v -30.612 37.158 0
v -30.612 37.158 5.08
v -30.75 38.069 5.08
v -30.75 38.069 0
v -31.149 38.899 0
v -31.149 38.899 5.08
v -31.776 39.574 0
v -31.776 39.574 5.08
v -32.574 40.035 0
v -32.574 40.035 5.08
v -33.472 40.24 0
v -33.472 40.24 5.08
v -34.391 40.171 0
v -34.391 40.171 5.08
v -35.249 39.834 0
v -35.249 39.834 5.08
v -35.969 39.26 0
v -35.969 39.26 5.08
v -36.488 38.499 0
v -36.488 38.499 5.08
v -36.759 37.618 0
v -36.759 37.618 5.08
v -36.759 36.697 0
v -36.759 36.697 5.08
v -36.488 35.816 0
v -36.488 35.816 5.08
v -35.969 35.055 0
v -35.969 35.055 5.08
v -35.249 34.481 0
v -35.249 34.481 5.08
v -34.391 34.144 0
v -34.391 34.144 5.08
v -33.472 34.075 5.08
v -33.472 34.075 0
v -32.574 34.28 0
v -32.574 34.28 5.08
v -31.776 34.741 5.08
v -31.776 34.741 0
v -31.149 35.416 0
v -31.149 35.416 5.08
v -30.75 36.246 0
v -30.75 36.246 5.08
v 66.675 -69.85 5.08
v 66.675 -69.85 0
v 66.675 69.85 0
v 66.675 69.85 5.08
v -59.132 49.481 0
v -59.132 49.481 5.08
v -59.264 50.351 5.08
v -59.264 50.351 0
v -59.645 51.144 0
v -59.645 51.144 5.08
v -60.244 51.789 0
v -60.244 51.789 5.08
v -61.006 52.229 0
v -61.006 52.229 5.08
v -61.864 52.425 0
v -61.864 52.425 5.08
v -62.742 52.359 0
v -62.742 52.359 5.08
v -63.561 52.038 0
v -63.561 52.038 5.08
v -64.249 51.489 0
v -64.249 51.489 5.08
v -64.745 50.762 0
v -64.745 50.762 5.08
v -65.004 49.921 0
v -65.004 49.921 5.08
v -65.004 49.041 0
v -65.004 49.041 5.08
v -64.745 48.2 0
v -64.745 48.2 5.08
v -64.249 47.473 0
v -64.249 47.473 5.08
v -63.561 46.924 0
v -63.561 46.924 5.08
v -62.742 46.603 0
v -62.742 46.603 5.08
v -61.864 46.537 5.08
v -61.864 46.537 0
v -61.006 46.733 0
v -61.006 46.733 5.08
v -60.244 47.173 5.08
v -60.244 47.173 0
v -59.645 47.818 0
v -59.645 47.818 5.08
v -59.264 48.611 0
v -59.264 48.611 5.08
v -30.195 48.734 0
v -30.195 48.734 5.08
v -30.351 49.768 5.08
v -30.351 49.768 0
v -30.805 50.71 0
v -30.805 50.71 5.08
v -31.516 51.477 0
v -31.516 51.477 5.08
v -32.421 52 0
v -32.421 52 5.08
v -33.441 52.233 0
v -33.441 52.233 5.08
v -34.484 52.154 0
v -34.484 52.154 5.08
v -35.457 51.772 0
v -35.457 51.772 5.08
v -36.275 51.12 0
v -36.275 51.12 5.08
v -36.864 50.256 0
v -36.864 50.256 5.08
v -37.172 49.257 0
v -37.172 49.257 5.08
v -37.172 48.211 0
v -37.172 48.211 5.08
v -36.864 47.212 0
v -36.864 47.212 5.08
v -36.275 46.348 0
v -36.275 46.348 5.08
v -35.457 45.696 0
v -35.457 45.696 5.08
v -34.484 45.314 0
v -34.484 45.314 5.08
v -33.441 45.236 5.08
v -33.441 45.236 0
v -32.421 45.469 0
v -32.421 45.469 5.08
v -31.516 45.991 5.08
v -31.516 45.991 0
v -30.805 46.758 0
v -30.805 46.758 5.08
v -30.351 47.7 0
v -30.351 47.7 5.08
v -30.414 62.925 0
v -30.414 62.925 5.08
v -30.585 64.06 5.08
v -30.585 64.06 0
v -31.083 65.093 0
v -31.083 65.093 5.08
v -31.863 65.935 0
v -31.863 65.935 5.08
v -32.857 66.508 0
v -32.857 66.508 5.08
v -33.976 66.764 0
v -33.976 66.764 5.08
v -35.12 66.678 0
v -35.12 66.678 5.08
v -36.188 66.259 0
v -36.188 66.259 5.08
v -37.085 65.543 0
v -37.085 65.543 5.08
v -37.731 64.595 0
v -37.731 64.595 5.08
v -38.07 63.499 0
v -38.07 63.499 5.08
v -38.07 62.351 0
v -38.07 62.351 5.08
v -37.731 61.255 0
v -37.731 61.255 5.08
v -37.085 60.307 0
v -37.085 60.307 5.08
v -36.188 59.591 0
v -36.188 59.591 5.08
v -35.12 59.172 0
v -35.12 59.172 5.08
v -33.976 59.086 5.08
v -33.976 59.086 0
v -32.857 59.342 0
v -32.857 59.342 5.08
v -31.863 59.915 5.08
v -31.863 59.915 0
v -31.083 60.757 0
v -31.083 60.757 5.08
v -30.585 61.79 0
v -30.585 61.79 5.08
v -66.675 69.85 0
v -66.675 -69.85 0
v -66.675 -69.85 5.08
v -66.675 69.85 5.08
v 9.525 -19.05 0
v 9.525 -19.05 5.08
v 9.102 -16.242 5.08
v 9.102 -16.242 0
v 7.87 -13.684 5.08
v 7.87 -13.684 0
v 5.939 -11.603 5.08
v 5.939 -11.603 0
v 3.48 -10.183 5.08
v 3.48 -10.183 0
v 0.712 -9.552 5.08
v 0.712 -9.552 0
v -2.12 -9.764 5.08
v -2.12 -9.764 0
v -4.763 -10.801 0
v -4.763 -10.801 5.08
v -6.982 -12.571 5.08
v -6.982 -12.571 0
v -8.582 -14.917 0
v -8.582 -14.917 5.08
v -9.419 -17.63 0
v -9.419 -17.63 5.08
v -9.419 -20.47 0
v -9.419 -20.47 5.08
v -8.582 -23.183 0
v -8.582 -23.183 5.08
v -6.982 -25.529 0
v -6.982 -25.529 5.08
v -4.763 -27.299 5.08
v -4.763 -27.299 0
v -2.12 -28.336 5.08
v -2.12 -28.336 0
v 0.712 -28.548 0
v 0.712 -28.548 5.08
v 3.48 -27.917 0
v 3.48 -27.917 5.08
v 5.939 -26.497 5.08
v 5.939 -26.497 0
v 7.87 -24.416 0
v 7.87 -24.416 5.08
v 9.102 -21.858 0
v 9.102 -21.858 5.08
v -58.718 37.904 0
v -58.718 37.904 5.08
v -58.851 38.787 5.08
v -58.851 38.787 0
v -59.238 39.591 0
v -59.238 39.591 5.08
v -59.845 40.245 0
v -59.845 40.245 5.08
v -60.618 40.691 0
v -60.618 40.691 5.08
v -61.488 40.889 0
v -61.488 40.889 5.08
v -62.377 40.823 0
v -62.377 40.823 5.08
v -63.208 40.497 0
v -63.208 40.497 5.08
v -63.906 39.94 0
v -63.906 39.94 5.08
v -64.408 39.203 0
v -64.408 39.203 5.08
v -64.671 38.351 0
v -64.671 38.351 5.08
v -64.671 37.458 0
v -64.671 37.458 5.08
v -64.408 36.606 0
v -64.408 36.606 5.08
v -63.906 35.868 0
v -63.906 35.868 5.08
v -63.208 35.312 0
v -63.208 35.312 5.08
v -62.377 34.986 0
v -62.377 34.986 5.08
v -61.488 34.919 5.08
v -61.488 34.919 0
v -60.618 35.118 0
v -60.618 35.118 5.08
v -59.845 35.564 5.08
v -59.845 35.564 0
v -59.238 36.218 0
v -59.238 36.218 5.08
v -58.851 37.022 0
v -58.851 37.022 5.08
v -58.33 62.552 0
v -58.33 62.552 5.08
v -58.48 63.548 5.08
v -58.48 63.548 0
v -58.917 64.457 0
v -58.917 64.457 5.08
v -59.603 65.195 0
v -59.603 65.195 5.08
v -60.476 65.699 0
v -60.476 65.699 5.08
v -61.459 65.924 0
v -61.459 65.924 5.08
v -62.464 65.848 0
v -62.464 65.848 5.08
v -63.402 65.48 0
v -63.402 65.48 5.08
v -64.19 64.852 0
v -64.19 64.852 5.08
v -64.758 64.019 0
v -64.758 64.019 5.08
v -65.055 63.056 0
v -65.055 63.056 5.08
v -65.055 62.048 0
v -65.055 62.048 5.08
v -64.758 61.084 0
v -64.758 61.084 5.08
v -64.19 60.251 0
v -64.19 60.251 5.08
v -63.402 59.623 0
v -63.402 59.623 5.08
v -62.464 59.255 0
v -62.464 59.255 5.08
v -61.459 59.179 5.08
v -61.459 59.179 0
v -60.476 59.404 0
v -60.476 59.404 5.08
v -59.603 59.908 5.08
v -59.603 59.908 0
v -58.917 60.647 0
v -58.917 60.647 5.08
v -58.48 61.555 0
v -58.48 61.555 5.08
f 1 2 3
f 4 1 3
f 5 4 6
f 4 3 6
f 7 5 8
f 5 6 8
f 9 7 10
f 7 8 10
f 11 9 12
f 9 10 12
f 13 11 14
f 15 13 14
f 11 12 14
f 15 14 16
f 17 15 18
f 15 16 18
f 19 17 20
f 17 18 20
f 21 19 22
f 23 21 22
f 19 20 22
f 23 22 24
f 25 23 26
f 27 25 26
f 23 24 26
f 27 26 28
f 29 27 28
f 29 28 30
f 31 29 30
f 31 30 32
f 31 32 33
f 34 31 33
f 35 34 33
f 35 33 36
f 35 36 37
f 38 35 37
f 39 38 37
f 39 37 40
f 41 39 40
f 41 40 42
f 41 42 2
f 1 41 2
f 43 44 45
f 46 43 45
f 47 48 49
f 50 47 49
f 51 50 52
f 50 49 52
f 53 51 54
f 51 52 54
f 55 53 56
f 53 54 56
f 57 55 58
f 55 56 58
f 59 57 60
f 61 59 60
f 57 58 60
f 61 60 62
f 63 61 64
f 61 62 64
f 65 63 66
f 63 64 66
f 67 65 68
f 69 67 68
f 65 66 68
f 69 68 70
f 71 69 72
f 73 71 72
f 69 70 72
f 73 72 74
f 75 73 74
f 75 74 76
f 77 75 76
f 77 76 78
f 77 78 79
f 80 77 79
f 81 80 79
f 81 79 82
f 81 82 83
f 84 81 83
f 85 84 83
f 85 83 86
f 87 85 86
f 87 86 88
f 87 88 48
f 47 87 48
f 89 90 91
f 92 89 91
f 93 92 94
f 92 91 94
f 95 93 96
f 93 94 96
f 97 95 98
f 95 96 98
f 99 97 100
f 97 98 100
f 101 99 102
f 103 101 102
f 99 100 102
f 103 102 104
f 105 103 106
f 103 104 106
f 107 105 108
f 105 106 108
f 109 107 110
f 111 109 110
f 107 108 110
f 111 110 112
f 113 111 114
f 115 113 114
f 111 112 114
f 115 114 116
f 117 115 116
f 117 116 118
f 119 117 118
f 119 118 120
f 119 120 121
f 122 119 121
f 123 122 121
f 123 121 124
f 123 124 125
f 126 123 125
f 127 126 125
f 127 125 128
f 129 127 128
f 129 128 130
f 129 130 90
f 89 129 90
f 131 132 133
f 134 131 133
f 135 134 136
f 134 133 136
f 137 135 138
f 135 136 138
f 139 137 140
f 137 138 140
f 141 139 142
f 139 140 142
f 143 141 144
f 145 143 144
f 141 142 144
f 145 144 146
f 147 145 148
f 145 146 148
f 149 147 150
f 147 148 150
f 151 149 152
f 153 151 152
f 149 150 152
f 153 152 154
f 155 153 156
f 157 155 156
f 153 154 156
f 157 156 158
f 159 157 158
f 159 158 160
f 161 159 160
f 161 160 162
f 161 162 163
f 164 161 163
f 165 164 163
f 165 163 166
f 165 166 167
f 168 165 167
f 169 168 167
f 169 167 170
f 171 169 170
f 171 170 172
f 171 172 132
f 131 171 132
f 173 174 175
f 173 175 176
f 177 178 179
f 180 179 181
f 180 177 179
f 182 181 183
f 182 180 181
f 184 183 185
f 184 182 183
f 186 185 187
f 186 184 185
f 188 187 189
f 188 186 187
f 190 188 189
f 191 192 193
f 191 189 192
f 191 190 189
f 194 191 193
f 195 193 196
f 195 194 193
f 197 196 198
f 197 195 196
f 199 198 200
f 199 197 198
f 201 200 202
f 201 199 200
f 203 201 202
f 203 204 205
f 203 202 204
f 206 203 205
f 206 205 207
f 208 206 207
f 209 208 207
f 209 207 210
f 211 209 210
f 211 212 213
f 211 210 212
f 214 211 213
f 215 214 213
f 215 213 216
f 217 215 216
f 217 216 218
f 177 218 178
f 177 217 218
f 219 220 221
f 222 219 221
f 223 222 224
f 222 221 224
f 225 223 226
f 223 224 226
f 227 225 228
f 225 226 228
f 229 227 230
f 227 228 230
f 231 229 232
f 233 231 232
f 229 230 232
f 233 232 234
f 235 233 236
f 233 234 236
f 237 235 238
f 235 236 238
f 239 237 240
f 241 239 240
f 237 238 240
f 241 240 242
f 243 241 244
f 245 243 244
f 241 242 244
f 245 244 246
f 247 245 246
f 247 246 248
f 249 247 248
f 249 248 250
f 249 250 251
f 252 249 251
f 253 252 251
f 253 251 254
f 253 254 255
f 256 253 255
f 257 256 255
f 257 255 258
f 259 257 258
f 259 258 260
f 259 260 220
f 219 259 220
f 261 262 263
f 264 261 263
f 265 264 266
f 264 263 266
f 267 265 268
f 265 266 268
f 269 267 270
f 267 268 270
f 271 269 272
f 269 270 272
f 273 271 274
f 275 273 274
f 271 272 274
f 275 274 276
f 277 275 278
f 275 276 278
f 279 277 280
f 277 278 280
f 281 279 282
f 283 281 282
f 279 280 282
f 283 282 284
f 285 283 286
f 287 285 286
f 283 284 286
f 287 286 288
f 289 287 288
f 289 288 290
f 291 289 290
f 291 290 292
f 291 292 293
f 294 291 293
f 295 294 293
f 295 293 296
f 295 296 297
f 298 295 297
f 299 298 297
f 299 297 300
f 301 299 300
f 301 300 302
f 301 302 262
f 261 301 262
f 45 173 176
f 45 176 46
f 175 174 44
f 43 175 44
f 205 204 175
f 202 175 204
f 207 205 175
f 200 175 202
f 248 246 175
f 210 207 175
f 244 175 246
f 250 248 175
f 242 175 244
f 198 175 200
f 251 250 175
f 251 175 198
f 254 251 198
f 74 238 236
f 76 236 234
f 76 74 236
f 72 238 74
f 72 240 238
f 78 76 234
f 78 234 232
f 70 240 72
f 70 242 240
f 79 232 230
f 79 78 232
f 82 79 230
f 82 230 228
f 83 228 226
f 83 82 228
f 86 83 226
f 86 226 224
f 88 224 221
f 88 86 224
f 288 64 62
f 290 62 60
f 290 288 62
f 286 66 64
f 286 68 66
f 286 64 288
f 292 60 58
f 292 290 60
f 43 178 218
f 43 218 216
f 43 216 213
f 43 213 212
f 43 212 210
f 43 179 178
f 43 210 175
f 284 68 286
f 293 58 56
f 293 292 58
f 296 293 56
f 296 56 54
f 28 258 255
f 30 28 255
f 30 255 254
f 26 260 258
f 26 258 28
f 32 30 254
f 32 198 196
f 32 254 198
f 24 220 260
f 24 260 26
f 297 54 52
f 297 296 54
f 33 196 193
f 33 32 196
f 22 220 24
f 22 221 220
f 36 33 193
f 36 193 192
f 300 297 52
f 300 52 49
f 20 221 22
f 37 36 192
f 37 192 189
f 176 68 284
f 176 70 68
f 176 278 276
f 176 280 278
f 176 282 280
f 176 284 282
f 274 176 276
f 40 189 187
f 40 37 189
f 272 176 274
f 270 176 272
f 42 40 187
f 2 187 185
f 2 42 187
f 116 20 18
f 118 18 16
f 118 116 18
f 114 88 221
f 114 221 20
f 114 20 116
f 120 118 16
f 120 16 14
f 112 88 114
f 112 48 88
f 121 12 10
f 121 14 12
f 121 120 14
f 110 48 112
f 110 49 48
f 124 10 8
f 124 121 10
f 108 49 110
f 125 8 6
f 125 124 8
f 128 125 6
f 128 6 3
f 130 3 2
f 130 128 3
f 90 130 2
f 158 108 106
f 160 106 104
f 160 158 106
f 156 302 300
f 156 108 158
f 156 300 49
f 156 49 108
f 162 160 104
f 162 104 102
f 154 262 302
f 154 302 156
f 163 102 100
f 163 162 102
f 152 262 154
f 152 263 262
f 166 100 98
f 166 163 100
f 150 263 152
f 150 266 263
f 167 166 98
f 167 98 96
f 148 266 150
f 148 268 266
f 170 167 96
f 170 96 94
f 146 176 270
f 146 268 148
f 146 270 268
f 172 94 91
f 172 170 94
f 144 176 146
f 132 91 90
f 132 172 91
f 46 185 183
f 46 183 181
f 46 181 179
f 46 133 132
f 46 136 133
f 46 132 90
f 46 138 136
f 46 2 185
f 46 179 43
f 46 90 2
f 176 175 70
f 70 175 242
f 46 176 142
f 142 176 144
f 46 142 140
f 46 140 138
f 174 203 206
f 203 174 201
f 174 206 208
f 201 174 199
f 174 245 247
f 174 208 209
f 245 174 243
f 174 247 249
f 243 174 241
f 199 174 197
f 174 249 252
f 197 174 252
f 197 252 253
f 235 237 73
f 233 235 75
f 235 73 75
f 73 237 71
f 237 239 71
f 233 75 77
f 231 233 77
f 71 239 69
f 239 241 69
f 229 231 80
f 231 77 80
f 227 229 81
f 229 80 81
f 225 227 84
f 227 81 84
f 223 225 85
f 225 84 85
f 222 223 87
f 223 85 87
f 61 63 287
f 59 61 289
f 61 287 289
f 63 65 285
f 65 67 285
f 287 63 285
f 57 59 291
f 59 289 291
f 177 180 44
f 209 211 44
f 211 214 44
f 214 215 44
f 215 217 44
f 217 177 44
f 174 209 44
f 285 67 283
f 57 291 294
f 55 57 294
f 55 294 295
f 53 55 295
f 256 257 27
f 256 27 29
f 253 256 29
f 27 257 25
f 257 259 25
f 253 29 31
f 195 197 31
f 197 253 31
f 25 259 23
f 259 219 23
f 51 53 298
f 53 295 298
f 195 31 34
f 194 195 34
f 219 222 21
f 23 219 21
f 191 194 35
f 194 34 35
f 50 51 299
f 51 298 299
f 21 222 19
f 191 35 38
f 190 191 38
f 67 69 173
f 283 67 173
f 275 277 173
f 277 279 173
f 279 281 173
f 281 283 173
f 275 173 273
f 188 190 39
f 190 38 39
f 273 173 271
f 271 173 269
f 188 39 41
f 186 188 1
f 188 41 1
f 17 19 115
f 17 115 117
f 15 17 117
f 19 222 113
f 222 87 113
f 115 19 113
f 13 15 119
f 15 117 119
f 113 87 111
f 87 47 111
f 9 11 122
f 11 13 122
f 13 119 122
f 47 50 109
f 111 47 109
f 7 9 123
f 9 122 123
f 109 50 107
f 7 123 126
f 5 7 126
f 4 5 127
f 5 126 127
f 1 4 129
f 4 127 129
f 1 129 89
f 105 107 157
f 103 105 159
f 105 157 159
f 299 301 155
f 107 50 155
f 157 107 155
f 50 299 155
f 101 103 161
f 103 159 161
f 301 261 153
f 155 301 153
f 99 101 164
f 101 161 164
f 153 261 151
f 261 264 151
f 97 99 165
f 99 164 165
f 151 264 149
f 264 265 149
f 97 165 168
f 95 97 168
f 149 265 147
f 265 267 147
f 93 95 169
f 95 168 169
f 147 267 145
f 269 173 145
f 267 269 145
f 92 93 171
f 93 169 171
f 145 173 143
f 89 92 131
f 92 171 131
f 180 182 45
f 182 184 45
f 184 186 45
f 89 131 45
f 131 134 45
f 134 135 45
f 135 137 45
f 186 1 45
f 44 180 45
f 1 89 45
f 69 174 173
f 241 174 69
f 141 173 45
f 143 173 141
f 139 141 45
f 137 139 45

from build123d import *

# Parameters (mm, degrees)
F0_W     = 133.35
F0_H     = 139.7
F1_DEPTH = 5.08
F2_R     = 9.525
F3_DEPTH = 27.178
F4_R     = 3.381666
F4_R_2   = 2.993363
F4_R_3   = 2.952318
F4_R_4   = 3.849352
F4_R_5   = 3.508168
F4_R_6   = 3.090783
F5_DEPTH = 25.4


with BuildPart() as f1:
    # F0 (on Top) → F1 (new body)
    with BuildSketch(Plane.XY):
        Rectangle(F0_W, F0_H)
    extrude(amount=F1_DEPTH)

    # F2 (on Top) → F3 (cut)
    with BuildSketch(Plane.XY):
        with Locations((0, -19.05)):
            Circle(F2_R)
    extrude(amount=F3_DEPTH, mode=Mode.SUBTRACT)

    # F4 (on face) → F5 (cut)
    with BuildSketch(Plane.XY.offset(5.08)):
        with Locations((-61.71133, 62.55158)):
            Circle(F4_R)
        with Locations((-61.71133, 37.904385)):
            Circle(F4_R_2)
        with Locations((-62.084772, 49.481098)):
            Circle(F4_R_3)
        with Locations((-34.263328, 62.925018)):
            Circle(F4_R_4)
        with Locations((-33.703163, 48.734214)):
            Circle(F4_R_5)
        with Locations((-33.703163, 37.157502)):
            Circle(F4_R_6)
    extrude(amount=-F5_DEPTH, mode=Mode.SUBTRACT)


solid = f1.part
